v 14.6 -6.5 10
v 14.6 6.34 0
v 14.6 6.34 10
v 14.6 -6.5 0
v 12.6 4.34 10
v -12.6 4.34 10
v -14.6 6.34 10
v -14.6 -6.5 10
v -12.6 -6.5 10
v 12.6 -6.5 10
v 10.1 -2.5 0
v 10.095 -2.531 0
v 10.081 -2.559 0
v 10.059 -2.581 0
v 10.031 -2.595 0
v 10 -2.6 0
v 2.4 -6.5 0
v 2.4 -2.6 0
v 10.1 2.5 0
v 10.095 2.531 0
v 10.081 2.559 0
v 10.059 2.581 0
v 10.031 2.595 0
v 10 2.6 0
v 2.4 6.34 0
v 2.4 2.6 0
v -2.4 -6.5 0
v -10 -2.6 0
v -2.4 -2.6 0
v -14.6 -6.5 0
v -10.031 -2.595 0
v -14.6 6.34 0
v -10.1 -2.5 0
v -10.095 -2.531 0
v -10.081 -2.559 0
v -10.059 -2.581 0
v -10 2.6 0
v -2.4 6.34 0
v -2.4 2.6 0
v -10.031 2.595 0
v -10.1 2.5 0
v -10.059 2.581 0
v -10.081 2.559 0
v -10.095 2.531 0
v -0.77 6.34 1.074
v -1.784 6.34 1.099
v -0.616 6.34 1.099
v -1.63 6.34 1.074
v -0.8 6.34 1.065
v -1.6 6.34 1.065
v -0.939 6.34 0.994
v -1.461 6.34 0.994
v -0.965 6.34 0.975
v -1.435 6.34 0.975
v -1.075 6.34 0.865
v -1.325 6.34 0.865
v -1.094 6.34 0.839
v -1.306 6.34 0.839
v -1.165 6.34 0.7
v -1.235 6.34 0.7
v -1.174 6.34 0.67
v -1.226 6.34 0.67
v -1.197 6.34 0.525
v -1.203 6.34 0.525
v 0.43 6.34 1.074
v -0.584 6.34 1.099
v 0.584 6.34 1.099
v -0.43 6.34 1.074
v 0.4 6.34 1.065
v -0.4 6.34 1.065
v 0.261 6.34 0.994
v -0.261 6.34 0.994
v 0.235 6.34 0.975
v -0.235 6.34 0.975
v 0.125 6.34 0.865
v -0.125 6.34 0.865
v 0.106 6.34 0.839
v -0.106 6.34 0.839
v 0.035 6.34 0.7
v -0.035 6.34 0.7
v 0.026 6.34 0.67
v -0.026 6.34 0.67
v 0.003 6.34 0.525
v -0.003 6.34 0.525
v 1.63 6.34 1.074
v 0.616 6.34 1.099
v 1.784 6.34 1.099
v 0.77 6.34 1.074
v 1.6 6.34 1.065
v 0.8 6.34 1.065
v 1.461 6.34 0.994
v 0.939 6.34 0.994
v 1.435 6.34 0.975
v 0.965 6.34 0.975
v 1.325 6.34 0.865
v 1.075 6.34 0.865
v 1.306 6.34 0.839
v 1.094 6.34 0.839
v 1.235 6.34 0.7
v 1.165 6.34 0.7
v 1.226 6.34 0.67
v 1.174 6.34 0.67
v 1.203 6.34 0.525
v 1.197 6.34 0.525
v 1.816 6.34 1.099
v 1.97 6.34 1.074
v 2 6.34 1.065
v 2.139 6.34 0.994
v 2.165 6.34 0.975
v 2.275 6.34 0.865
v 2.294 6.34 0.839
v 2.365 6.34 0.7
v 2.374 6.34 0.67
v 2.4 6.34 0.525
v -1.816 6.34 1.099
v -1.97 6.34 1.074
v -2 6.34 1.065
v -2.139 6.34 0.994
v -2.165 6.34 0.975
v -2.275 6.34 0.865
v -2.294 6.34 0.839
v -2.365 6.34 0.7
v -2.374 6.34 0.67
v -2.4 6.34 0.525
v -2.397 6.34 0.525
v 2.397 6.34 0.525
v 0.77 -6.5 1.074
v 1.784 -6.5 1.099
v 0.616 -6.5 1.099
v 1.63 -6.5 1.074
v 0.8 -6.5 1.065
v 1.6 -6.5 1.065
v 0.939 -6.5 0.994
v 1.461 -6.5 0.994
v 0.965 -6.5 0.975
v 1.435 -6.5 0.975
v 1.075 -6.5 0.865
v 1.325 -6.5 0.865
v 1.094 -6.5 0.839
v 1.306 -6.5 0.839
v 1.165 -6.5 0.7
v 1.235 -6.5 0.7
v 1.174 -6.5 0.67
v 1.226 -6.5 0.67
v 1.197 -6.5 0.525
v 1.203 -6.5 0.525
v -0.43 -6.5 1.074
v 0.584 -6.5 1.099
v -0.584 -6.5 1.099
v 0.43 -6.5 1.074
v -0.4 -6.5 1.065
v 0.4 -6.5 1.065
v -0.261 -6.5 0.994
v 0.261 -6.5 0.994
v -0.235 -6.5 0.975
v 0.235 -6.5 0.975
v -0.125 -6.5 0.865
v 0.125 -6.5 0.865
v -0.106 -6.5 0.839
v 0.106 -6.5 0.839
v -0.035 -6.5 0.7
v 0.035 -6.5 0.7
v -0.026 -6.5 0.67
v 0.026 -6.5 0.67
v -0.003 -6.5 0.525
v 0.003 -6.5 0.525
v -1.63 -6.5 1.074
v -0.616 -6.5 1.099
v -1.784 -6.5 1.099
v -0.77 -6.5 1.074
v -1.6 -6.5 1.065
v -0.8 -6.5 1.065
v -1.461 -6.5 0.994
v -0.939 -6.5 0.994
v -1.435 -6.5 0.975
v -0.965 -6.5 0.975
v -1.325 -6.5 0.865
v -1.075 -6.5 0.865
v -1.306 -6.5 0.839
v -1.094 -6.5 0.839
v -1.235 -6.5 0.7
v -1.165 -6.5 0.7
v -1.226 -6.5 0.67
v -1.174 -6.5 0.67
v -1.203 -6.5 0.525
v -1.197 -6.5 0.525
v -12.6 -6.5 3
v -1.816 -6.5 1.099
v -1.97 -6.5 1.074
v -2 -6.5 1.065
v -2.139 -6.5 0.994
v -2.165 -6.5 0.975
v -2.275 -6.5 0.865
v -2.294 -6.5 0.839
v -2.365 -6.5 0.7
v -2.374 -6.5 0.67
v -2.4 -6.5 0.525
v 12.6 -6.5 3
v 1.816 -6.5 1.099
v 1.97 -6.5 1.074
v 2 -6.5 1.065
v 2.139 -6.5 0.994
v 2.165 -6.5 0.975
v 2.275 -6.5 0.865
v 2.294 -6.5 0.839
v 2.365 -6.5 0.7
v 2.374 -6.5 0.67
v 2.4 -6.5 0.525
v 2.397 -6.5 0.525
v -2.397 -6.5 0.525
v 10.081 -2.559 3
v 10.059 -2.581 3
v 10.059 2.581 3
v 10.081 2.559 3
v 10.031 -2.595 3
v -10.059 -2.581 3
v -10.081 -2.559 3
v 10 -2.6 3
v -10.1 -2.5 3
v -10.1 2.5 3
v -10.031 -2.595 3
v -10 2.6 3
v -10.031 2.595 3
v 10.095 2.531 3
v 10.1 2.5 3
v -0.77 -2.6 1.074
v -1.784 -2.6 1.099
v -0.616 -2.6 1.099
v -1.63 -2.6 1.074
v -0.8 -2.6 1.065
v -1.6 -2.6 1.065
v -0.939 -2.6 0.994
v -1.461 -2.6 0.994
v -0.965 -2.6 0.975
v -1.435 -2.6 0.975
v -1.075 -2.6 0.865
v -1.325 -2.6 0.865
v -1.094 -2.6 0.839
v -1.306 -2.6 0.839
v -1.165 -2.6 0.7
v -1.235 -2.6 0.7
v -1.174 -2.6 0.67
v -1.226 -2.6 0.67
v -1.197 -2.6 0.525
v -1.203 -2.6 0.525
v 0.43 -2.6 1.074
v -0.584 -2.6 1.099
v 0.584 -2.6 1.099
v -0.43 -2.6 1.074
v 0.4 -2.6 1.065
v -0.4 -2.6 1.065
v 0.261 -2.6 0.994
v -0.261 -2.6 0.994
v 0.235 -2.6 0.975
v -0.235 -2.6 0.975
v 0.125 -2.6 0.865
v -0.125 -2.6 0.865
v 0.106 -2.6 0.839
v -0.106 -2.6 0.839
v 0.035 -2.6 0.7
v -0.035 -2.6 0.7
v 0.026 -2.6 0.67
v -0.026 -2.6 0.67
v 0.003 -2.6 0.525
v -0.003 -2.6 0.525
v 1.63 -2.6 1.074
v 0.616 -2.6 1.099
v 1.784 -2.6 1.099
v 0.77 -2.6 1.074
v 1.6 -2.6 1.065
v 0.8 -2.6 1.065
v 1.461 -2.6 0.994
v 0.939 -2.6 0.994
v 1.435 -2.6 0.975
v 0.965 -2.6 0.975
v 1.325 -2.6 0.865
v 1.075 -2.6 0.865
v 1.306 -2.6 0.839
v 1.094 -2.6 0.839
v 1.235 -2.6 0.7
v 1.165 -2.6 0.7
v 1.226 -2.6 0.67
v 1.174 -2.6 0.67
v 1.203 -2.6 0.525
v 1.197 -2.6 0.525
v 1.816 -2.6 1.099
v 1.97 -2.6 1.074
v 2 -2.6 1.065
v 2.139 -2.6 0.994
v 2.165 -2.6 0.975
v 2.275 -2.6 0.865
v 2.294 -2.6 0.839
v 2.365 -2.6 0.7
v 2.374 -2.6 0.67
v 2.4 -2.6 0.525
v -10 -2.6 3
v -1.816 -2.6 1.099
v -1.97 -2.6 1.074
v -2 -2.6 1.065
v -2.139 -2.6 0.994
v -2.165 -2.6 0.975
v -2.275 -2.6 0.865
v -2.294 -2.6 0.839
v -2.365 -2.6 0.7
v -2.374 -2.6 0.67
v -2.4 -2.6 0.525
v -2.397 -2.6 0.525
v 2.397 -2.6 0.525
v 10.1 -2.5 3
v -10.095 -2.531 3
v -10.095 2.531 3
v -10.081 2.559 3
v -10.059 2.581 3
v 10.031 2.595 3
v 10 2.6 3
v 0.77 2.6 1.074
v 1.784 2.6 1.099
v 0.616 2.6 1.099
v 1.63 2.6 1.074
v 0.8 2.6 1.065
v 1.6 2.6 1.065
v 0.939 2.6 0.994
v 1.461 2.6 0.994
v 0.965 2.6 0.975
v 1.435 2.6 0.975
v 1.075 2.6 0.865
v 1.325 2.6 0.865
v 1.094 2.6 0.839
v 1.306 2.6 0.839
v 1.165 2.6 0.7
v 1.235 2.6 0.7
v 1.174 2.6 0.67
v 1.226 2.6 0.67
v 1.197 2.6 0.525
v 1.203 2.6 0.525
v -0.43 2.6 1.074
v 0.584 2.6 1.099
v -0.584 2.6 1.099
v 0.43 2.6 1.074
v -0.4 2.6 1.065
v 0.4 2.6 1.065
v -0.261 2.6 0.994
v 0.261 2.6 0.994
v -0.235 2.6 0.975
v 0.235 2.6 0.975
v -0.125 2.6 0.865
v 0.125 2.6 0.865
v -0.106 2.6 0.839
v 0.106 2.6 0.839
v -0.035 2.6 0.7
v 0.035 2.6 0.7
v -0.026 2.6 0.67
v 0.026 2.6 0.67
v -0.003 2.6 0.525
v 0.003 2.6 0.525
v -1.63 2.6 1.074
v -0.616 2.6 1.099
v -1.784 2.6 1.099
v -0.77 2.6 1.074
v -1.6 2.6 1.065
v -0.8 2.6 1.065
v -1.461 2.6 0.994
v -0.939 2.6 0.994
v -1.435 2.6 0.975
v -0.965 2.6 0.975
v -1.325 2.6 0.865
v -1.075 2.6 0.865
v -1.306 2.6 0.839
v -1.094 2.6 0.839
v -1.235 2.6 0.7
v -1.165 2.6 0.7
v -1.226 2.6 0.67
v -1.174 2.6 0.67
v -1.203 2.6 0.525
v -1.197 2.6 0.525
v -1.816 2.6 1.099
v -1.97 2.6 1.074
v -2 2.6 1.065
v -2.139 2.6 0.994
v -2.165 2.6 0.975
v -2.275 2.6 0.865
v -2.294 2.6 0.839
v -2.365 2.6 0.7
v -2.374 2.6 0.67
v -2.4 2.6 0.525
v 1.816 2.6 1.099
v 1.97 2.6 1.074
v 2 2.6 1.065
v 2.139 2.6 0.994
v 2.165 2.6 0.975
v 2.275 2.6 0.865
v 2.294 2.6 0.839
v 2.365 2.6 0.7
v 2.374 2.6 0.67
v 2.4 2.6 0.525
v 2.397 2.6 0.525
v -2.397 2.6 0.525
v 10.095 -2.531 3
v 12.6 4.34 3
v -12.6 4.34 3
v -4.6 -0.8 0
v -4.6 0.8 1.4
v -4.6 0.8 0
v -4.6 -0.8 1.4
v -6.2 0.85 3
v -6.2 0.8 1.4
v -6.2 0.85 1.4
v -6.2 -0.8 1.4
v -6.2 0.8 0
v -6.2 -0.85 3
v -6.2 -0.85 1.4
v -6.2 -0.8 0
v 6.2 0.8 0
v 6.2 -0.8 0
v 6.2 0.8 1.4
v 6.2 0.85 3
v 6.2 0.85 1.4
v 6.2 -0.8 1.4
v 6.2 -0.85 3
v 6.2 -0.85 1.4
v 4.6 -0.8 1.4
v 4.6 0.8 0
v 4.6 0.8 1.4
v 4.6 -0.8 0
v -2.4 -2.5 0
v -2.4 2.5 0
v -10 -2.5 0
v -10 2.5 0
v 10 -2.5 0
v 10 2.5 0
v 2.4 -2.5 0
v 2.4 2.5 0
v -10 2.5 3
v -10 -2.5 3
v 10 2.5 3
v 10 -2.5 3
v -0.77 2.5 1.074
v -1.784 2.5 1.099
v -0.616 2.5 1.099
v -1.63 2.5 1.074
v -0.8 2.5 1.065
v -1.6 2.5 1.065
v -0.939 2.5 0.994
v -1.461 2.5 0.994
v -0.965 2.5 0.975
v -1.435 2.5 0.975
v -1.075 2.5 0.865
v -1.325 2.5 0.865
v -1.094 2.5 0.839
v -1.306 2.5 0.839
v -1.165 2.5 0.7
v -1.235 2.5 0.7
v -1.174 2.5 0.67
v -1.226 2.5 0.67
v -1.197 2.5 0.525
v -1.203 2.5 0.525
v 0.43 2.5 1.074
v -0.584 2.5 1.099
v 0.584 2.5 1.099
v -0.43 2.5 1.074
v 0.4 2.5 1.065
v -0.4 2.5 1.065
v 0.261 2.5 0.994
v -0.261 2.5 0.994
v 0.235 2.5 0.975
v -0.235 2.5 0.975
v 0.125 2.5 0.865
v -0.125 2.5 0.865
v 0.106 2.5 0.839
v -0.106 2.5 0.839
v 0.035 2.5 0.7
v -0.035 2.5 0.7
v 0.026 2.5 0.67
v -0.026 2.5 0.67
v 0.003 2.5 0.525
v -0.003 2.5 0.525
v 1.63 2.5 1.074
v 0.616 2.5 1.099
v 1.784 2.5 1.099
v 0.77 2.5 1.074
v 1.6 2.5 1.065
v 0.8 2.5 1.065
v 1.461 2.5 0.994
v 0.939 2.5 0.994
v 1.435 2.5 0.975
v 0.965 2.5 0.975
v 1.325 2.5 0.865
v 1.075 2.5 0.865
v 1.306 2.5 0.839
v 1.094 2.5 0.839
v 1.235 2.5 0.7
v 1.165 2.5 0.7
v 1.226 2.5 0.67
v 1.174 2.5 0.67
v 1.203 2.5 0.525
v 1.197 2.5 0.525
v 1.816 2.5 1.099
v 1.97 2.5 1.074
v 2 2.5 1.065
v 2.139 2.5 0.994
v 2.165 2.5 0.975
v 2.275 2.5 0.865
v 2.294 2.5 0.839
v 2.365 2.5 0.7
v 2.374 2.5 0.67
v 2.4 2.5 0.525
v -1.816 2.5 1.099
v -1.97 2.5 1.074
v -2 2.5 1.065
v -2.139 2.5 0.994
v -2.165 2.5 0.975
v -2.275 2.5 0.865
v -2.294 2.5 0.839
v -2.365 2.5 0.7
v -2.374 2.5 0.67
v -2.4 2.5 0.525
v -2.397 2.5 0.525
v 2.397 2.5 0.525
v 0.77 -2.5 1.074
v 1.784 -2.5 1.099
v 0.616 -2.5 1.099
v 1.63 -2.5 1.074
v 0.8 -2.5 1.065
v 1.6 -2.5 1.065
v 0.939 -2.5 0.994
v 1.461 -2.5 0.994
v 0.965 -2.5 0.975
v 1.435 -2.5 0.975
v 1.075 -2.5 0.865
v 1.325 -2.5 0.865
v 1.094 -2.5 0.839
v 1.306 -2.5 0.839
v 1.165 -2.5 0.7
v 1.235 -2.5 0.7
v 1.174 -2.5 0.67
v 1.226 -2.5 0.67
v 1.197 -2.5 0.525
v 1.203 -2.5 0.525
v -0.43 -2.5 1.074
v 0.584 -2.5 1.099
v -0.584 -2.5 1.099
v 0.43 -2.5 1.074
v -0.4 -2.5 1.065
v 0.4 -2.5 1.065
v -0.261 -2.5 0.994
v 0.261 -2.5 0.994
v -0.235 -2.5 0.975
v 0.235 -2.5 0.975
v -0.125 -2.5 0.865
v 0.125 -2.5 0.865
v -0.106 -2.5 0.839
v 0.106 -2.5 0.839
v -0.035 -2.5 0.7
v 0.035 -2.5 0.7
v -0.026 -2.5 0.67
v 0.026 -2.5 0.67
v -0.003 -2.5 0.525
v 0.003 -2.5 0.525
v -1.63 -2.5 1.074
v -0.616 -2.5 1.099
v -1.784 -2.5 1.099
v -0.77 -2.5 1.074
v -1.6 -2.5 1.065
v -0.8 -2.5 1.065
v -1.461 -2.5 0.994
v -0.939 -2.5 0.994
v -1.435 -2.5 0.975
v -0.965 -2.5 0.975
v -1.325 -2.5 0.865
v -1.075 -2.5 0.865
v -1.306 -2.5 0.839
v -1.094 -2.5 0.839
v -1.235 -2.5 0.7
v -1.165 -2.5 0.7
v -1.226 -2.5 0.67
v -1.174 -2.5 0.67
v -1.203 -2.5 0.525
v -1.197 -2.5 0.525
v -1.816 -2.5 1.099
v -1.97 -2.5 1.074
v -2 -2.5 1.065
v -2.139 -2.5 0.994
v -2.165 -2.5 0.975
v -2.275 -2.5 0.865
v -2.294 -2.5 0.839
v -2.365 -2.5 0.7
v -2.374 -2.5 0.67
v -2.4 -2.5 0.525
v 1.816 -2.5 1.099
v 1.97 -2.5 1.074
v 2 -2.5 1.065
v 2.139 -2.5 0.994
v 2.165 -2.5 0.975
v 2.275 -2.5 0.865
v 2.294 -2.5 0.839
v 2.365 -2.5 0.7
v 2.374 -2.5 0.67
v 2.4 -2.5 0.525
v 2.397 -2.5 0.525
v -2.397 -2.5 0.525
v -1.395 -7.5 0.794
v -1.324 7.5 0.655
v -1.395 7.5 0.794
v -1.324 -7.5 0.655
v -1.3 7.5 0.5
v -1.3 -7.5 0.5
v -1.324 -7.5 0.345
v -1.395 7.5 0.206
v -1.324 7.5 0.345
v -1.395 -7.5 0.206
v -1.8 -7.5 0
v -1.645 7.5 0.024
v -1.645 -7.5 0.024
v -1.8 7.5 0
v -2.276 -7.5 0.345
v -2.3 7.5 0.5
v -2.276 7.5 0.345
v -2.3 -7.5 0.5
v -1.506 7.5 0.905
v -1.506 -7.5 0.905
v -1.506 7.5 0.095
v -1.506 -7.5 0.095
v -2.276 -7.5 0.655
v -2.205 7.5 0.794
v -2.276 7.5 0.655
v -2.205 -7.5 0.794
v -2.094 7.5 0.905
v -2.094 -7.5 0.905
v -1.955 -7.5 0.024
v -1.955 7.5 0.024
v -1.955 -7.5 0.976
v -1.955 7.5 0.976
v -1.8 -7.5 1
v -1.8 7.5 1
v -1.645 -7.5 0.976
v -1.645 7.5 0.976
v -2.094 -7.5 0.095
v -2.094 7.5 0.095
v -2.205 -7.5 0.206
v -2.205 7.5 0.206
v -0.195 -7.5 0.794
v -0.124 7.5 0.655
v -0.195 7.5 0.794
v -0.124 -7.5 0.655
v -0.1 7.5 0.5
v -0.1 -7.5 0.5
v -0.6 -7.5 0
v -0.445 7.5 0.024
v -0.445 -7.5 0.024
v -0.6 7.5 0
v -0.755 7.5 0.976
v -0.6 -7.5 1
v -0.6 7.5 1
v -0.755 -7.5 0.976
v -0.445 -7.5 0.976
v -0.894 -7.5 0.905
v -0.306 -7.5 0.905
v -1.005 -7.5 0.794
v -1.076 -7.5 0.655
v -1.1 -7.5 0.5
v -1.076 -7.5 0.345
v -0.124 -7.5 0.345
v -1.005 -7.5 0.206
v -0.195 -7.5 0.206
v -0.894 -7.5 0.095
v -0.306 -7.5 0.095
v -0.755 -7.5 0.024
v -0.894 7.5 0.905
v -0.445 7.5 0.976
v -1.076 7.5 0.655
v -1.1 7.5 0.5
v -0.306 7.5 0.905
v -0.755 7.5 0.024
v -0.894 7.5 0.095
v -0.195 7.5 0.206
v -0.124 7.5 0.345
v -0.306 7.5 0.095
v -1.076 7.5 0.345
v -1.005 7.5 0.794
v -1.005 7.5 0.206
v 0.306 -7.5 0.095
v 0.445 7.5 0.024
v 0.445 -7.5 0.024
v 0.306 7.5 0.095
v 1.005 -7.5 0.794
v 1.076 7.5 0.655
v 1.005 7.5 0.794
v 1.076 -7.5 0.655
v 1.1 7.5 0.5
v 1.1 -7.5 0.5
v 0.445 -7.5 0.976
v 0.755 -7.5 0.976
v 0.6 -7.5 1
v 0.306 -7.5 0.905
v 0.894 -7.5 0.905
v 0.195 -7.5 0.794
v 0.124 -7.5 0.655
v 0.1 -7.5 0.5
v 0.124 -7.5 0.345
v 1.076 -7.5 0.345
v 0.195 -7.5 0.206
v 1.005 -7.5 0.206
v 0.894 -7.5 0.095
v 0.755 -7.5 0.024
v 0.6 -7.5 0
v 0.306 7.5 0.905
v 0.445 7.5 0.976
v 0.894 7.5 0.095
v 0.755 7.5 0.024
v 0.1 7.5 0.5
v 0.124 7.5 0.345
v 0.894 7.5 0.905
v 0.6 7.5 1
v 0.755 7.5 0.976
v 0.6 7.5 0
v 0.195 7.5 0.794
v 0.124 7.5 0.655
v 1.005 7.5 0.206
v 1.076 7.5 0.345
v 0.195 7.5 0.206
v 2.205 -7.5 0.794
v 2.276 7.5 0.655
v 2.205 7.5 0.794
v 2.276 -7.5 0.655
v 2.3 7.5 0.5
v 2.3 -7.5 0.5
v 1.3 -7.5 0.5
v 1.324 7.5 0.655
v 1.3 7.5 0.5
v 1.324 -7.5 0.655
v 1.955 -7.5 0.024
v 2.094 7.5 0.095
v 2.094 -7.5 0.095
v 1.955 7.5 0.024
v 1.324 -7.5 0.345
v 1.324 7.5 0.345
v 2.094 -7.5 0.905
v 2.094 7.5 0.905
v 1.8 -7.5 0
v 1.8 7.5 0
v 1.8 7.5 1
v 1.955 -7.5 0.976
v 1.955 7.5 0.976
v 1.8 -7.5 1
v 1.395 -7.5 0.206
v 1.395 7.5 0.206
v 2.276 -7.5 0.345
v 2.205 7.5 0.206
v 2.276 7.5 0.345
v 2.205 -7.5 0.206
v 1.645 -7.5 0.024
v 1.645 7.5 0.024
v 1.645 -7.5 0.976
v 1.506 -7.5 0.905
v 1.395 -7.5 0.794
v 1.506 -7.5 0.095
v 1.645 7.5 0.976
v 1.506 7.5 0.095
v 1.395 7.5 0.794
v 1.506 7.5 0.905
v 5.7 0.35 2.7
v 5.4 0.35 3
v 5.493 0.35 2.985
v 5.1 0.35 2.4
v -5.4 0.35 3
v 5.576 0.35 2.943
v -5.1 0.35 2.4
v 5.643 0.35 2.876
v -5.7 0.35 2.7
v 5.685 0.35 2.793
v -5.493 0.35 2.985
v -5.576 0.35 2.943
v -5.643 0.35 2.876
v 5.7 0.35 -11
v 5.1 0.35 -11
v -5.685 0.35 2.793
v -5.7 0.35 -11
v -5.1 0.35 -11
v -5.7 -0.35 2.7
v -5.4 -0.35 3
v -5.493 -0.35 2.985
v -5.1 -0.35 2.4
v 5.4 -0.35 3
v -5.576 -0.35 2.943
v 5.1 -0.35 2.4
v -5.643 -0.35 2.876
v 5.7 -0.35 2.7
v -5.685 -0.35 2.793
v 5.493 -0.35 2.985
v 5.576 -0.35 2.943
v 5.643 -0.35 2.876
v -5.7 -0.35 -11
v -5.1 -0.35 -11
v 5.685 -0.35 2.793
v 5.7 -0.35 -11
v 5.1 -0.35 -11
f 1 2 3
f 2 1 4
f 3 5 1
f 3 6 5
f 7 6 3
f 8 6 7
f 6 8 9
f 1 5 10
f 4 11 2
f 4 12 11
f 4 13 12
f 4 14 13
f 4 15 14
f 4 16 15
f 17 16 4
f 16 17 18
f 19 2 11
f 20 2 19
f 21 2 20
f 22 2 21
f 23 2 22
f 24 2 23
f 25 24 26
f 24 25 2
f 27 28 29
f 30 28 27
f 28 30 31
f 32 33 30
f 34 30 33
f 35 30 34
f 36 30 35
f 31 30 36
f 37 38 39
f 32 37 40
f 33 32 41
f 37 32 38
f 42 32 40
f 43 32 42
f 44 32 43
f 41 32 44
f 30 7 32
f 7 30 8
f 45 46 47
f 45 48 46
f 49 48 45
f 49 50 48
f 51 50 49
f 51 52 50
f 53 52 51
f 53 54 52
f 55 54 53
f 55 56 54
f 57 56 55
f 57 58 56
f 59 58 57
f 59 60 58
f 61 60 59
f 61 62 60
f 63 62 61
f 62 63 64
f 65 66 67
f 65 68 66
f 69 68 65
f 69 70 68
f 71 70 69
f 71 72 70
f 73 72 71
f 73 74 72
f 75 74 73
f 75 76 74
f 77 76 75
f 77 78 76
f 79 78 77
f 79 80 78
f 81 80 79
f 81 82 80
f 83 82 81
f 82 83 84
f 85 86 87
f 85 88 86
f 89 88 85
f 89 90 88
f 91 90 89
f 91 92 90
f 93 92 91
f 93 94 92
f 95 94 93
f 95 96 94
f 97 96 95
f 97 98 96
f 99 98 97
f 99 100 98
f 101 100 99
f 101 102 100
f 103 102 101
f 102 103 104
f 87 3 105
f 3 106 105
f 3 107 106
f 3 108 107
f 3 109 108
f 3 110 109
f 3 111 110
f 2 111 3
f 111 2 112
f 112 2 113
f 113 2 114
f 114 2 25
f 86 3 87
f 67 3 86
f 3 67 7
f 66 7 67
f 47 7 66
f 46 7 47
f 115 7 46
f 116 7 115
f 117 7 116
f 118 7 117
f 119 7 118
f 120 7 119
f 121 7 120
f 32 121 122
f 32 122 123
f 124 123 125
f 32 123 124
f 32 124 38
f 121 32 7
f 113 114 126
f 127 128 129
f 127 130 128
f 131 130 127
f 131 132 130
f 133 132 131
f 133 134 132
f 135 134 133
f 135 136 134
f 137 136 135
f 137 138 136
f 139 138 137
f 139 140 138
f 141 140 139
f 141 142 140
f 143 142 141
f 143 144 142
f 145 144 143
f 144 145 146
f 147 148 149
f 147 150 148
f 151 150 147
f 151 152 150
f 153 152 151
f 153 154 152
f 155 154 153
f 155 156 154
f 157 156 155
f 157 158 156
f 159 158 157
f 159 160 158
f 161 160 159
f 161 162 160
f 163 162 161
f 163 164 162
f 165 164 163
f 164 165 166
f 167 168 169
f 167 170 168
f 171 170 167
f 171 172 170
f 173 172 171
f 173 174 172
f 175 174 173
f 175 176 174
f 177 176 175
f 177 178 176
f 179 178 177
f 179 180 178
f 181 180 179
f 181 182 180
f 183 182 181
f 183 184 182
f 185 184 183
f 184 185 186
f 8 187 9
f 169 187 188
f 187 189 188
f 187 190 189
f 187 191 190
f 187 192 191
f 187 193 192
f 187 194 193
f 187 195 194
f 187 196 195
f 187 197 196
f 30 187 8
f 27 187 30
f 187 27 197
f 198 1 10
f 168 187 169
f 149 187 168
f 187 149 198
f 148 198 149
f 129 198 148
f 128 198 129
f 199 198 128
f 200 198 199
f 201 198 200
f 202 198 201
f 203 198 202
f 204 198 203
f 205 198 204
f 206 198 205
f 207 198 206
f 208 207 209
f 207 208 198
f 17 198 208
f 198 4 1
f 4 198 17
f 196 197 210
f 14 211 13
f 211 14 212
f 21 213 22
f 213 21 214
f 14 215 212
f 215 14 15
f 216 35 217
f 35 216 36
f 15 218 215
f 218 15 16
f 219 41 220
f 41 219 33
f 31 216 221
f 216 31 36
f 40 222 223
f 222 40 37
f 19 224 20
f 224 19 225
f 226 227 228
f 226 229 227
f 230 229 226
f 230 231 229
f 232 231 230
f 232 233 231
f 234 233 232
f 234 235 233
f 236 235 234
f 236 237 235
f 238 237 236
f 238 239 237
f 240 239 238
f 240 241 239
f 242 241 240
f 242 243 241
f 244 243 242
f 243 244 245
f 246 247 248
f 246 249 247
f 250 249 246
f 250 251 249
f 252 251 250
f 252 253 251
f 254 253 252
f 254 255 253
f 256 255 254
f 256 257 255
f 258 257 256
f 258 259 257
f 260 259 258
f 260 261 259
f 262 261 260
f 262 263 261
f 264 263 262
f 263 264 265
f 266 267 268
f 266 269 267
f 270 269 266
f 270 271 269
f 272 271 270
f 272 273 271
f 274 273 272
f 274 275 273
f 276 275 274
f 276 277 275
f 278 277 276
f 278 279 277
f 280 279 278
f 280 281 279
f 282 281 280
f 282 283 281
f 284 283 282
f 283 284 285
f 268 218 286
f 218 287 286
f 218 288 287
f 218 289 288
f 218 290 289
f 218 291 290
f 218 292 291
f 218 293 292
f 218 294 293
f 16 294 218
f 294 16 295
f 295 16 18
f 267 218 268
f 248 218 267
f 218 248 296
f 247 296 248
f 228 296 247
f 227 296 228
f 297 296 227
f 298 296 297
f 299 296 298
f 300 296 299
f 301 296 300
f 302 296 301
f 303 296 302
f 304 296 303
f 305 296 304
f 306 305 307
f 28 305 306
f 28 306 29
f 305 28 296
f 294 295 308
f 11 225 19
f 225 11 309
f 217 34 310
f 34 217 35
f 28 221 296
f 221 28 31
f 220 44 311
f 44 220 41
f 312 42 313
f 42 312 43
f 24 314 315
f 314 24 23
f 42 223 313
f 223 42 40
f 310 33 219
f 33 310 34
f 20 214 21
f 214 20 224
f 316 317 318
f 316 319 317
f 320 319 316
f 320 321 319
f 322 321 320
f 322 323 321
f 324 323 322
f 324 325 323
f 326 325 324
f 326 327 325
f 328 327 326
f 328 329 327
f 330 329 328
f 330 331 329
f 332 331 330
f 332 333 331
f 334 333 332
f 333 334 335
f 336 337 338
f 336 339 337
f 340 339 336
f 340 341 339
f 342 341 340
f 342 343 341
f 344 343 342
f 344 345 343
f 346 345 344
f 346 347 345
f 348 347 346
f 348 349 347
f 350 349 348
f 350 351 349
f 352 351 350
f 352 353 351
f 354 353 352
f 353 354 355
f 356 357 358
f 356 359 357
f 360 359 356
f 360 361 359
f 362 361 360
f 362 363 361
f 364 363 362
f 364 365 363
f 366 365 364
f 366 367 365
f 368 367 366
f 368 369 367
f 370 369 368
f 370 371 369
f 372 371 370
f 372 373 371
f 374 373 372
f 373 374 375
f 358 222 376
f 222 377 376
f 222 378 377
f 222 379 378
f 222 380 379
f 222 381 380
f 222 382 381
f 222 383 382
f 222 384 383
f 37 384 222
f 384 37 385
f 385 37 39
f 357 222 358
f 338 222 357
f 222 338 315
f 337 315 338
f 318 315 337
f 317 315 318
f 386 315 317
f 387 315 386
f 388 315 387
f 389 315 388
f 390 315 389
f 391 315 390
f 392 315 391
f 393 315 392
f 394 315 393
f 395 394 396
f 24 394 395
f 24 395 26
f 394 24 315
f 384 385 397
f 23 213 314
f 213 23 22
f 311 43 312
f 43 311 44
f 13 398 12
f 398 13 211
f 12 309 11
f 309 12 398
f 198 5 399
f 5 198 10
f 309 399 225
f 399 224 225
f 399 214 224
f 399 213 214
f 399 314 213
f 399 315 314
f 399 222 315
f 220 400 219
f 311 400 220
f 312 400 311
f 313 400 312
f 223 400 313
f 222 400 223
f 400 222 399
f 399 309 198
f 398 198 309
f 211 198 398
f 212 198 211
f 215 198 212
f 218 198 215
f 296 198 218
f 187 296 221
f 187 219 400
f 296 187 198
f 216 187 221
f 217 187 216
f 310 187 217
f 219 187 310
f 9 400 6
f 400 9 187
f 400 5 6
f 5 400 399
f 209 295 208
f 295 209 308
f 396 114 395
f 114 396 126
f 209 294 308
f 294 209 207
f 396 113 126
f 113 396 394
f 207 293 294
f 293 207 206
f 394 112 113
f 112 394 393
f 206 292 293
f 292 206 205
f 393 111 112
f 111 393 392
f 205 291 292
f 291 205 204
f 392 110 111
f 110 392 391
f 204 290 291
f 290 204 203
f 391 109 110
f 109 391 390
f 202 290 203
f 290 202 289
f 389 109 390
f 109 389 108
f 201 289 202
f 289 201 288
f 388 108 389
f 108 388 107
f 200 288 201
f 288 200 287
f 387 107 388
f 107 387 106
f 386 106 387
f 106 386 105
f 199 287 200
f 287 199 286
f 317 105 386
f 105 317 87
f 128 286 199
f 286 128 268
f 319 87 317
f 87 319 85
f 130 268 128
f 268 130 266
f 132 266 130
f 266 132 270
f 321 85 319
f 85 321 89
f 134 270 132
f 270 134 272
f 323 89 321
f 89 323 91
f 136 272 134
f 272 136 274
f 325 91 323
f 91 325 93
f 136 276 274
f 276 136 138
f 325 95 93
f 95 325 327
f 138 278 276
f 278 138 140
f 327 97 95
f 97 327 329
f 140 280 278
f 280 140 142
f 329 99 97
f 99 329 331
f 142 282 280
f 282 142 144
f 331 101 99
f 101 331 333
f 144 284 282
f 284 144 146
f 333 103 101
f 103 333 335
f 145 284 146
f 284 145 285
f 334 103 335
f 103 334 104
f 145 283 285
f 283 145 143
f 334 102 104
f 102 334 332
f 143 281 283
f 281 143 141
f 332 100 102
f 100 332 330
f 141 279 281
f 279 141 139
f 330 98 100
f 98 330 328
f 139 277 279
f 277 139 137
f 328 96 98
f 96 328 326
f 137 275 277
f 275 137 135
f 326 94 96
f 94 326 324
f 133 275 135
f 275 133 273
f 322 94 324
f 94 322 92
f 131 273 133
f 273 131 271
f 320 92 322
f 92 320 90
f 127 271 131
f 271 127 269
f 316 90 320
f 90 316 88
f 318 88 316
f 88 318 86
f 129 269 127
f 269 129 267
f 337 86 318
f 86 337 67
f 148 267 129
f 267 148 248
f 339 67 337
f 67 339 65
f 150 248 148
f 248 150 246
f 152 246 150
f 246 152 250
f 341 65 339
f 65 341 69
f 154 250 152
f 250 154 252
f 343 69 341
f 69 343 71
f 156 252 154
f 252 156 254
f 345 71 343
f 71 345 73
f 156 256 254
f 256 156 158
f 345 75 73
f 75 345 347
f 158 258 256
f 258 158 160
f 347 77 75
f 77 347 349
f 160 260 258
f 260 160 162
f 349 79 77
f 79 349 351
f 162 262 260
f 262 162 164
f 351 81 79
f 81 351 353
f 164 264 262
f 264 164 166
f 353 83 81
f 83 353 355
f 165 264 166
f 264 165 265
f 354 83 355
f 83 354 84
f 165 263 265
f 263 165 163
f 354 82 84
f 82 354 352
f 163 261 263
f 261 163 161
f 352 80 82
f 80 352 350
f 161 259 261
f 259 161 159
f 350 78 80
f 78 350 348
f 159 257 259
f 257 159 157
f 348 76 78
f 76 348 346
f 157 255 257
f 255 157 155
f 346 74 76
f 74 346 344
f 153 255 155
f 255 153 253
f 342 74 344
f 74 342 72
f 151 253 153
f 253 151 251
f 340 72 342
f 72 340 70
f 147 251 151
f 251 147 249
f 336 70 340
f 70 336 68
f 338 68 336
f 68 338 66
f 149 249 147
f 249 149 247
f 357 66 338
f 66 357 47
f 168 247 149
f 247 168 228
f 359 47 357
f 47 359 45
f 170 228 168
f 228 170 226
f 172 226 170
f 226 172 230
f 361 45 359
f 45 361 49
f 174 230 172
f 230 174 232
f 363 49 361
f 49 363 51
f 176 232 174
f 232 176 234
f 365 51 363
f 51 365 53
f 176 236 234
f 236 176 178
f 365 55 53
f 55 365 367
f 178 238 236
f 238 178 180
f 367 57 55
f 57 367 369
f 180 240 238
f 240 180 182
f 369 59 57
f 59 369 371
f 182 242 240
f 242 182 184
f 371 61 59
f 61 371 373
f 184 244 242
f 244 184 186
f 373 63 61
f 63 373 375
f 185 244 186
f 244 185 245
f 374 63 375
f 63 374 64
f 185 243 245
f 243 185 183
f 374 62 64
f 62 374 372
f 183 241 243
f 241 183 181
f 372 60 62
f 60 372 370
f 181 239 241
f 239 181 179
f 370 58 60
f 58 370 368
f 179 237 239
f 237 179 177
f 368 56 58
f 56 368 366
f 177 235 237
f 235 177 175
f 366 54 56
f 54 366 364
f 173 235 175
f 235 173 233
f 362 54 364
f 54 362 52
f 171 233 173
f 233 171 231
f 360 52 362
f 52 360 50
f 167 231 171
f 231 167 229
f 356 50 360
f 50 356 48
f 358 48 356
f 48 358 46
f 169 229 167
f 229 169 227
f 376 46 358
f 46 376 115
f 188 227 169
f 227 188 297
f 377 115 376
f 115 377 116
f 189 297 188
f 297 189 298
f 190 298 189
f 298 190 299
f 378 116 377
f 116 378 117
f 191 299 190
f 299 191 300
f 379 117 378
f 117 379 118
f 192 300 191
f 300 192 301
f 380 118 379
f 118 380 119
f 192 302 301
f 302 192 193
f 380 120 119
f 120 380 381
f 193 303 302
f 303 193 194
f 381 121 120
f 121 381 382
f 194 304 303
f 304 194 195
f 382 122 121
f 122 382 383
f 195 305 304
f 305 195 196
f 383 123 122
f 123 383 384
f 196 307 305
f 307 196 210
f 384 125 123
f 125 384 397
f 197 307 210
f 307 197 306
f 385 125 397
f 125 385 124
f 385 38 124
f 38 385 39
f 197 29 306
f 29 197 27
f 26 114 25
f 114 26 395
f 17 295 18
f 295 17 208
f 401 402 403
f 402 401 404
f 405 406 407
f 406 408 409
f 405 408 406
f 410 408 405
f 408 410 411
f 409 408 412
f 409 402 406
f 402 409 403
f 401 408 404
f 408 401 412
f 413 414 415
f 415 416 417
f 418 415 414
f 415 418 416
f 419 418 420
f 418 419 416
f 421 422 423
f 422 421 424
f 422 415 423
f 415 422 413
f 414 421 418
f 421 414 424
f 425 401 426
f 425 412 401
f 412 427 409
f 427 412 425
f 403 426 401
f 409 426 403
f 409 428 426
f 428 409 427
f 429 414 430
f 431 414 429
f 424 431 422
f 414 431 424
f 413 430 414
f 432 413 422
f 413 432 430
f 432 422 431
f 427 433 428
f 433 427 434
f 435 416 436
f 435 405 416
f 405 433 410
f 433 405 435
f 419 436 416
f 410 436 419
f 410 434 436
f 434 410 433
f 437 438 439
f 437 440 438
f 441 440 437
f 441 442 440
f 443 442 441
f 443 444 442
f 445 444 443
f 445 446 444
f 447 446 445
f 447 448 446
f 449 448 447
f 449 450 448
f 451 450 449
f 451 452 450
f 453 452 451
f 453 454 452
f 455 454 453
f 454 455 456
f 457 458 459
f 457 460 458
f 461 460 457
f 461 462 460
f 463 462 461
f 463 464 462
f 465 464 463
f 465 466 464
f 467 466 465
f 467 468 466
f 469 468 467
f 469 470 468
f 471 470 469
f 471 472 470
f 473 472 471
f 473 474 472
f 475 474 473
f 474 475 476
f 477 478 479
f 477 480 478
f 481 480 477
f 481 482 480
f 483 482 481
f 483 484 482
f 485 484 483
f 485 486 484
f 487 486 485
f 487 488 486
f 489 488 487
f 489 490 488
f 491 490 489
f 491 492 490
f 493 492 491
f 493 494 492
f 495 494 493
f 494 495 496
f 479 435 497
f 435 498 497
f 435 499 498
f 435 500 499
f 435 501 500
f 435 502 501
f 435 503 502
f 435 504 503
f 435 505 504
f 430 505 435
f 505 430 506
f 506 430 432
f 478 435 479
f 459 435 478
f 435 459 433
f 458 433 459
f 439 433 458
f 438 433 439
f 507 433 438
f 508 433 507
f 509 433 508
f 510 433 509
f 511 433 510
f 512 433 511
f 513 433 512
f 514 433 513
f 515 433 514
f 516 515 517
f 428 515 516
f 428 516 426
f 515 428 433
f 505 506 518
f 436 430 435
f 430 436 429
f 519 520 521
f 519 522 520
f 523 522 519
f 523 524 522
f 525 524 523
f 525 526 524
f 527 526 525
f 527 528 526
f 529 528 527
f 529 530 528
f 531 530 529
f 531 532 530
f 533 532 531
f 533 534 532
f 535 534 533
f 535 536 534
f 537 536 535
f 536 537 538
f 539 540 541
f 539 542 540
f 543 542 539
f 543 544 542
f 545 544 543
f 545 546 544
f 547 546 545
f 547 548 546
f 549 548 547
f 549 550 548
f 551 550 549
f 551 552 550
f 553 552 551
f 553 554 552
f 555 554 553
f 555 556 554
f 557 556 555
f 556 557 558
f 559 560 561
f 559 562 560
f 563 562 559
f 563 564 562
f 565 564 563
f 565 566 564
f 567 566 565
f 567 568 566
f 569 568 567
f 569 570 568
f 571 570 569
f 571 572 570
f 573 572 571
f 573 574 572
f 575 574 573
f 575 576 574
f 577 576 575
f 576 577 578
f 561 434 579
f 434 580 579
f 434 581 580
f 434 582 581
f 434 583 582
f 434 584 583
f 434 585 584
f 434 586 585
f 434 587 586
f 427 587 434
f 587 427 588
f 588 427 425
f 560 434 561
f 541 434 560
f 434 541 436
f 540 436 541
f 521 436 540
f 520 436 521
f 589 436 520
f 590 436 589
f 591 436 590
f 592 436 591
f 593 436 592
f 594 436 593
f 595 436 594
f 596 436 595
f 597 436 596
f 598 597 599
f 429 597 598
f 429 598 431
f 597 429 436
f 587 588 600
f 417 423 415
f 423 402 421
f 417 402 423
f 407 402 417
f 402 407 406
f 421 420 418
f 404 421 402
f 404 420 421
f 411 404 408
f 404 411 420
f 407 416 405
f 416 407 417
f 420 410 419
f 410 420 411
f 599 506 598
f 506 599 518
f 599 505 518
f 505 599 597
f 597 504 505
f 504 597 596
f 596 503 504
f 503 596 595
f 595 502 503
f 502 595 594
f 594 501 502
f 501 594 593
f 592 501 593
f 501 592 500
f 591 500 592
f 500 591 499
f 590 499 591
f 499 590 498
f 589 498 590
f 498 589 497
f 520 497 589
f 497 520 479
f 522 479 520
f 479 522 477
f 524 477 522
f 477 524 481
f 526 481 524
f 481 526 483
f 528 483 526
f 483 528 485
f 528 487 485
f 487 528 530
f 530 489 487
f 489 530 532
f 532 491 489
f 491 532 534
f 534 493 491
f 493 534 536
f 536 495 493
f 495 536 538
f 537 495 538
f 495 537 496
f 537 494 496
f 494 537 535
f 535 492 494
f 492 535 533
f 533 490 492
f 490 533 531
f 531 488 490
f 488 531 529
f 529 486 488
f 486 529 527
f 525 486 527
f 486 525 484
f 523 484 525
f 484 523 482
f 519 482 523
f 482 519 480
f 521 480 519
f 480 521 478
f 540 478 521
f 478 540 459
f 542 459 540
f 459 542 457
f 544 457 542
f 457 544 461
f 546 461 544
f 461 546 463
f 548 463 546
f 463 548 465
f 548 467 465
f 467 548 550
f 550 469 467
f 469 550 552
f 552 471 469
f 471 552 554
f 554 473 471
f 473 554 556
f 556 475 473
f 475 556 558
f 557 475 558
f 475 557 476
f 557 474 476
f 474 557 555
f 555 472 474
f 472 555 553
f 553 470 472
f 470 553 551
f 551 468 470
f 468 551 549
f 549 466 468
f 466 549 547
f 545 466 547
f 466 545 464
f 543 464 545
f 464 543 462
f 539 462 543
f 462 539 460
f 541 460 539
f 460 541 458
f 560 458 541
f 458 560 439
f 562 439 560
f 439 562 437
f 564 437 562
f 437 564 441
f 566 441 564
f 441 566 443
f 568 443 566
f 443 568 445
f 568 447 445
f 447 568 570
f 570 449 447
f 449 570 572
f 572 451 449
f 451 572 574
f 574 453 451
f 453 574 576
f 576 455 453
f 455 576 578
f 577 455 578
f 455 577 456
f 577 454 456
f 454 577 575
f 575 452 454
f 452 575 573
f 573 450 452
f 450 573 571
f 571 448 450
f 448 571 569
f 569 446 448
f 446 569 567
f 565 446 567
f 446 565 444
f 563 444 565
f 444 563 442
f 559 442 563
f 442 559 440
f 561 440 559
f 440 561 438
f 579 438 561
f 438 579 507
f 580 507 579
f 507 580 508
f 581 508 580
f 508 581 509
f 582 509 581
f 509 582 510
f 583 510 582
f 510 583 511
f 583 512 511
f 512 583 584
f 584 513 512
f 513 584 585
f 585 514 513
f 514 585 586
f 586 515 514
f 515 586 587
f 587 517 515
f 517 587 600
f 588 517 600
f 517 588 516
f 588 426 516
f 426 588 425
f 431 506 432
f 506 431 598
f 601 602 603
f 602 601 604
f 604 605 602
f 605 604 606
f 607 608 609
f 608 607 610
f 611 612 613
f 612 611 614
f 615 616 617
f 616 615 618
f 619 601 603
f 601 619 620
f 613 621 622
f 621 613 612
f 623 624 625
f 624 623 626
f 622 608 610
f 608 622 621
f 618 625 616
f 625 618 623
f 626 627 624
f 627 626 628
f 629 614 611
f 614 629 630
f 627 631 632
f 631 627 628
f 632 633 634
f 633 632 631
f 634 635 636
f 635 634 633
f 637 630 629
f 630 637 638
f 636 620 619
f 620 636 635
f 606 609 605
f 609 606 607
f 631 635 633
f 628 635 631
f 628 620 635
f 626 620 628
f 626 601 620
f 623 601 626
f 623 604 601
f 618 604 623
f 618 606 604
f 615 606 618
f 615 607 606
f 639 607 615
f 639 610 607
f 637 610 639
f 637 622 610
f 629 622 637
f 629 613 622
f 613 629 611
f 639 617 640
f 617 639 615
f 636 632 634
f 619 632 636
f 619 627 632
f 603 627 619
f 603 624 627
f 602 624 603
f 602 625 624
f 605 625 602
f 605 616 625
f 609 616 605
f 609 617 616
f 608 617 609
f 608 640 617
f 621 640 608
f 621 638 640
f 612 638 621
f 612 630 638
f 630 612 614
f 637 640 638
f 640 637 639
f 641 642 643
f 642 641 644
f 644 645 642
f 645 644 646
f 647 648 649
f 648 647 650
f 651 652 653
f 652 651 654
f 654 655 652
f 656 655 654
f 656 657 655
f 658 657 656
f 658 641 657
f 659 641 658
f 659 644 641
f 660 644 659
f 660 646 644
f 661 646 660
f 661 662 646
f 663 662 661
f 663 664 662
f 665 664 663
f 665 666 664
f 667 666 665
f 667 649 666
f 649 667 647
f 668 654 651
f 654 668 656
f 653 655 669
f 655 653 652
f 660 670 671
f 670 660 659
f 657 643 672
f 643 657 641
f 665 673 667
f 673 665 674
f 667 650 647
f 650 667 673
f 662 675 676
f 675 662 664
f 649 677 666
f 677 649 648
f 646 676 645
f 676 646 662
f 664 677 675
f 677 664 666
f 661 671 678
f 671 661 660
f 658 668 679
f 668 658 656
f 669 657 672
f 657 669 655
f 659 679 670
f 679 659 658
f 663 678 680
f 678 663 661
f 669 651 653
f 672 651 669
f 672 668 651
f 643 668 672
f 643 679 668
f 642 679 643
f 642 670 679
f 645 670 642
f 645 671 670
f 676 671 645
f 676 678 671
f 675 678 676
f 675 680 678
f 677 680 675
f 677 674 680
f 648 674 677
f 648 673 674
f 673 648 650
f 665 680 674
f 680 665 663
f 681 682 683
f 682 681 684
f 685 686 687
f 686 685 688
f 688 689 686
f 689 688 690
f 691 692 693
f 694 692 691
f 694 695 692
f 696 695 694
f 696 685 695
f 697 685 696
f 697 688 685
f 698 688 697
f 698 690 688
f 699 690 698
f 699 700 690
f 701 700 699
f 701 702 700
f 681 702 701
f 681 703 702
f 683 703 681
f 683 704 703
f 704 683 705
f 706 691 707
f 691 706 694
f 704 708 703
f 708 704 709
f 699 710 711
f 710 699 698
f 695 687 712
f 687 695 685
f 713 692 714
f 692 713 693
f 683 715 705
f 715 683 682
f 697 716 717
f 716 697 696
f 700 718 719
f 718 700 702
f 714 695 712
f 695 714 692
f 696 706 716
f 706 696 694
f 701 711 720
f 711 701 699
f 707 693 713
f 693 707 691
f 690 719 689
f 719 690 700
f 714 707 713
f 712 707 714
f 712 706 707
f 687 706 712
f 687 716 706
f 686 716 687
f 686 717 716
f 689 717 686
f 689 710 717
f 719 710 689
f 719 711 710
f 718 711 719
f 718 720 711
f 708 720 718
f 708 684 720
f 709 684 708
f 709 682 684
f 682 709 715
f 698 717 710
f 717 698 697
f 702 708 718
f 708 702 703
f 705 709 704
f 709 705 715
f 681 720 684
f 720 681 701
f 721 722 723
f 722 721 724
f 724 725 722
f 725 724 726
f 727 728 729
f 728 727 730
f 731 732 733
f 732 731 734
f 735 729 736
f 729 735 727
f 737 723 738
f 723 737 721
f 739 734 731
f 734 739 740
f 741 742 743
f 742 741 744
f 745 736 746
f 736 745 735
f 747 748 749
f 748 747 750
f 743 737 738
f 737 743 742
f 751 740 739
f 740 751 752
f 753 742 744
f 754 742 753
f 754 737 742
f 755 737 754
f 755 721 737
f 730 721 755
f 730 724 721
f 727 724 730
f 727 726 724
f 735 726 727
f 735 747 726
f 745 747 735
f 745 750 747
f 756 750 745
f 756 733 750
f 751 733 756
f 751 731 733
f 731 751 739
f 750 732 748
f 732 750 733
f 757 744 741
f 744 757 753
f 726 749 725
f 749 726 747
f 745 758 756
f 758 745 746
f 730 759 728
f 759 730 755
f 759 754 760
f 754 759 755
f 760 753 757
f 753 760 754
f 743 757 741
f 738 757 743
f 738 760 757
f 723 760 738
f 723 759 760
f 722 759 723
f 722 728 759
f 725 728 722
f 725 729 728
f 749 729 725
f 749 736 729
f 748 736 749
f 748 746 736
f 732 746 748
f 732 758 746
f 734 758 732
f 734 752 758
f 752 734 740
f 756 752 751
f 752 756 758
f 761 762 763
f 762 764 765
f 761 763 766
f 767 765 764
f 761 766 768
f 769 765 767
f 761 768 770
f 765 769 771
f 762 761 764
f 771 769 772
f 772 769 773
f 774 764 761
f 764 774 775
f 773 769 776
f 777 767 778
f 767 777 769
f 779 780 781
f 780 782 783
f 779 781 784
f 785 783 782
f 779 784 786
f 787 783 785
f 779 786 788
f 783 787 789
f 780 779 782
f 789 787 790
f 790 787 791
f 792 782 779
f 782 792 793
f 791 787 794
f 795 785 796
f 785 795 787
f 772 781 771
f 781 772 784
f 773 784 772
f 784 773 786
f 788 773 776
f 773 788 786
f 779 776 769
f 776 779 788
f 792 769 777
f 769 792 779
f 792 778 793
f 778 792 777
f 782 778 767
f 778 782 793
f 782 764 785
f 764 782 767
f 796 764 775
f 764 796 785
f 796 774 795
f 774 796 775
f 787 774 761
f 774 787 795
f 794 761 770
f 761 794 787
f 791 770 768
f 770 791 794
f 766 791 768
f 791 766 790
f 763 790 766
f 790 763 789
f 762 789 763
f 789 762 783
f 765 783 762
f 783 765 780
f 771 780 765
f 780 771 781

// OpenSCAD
// cable clamp for stabler

/* [show] */
$fn=20;
showStaple=true;
showCable=true;
showClamp=true;
showClampHolder=true;
showStaplerDummy=false;

/* [Cable] */
wireDia=1;
wireCount=4;
wireSpcng=0.2;

/* [Staples] */
stplType="53"; //["53","custom"]
stplCstmShldrWdth=11.4;
stplCstmWrWdth=0.7;
stplCstmWrThck=0.6;
stplLngth=14;

/* [Clamp Holder] */
//max. width of the stapler at the front
stplrWdth=25;
//offset from front to center of staple
stplrFrntOffset=4.24;
//wall thickness
minWallThck=2;
//spacing between holder and clamp
hldrSpcng=0.1;
//spacing between holder and stapler
stplrSpcng=0.1;
//height of the holder
hldrHght=10;

/* [Clamp] */
clmpStyle="block"; //["block","rndBlck"]
//overall Clamp Dimensions
clampDims=[20,5,3];
//spacing for the staple
stplSpcng=0.5;
cblSpcng=0.1;


/* [Hidden] */
fudge=0.1;
// -- staples --
//https://en.wikipedia.org/wiki/Staple_(fastener)
//https://de.wikipedia.org/wiki/Heftklammer

//[shoulder width , wire width , length/height, wire thick
stplDims= (stplType=="53") ? [11.4,0.7,stplLngth,0.6] : [stplCstmShldrWdth,stplCstmThck,stplLngth,cstmWrThck];

cblColors=["brown","red","orange","yellow","green","blue","purple","grey","white","black"];

//assembly
if (showClampHolder)
 color("grey") clampHolder();

if (showClamp)
  color("darkRed") clamp();
if (showStaple) 
  translate([0,0,clampDims.z-stplDims[3]]) staple();
if (showCable)
  cable();

module staple(){
  color("silver") rotate([90,0,0])  linear_extrude(stplDims.y,center=true){
    translate([0,stplDims[3]/2]) square([stplDims.x-stplDims[3],stplDims[3]],true);
    for (ix=[-1,1]){
      translate([ix*(stplDims.x-stplDims[3])/2,-stplDims.z/2+stplDims[3]*0.75]) 
        square([stplDims[3],stplDims.z-stplDims[3]/2],true);
      translate([ix*(stplDims.x-stplDims[3])/2,+stplDims[3]/2]) circle(d=stplDims[3],$fn=20);
    }
  }
}

module clamp(cut=false){
  
  if (cut)
    bodyShp();
  else
    difference(){
      linear_extrude(clampDims.z) bodyShp();
      translate([0,0,clampDims.z-stplDims[3]/2-stplSpcng+fudge/2]) 
        cube([stplDims.x+stplSpcng*2,stplDims.y+stplSpcng*2,stplDims[3]+stplSpcng*2+fudge],true);
      for (ix=[-1,1])
        translate([ix*(stplDims.x-stplDims[3])/2,0,(clampDims.z-fudge)/2]) 
          cube([stplDims[3]+stplSpcng*2,stplDims[3]+stplSpcng*2,clampDims.z+fudge],true);
      rotate([90,0,0]) linear_extrude(clampDims.y+fudge,center=true,convexity=3)
        cable(true);
    }
  
  module bodyShp(){
    if (clmpStyle=="block")
      square([clampDims.x,clampDims.y],true);
    else
      hull() for (ix=[-1,1])
        translate([ix*(clampDims.x-clampDims.y)/2,0]) circle(d=clampDims.y);
  }
}

module cable(cut=false){
  if (cut){
    for(ix=[-(wireCount-1)/2:(wireCount-1)/2])
      translate([ix*(wireDia+wireSpcng),wireDia/2]) offset(cblSpcng) circle(d=wireDia,$fn=20);
    translate([0,(wireDia-cblSpcng)/4-fudge/2]) 
      square([wireDia*(wireCount+wireSpcng)+cblSpcng*2+wireSpcng*2,wireDia/2+cblSpcng+fudge],true);
  }
  else
    for(ix=[-(wireCount-1)/2:(wireCount-1)/2]){
      col=cblColors[ix+(wireCount-1)/2];
      color(col) translate([ix*(wireDia+wireSpcng),0,wireDia/2]) 
        rotate([90,0,0]) cylinder(d=wireDia,h=clampDims.y*3,$fn=20,center=true);
    }
}

if (showStaplerDummy) staplerDummy();
  
module staplerDummy(){
  //cheap NOVUS J-01A hand stapler (discontinued)
  %translate([0,-stplDims.y/2,clampDims.z]){
    translate([0,4.6/2,5]) cube([24.9,4.6,10],true);
    translate([0,-(12-4.6)/2,4.5/2]) cube([23.3,12-4.6,4.5],true);
    translate([0,-(12-4.6)/2,4.5+ 5.5/2]) cube([23.3-0.4,12-4.6,5.5],true);
  }
}

module clampHolder(){
  //a holder to attach to the stapler
  
  //staplerside
  hldrDpth= (stplrFrntOffset>clampDims.y/2) ? stplrFrntOffset+minWallThck*3+clampDims.y/2+stplrSpcng : 0;
  ovDims=[stplrWdth+(minWallThck+stplrSpcng)*2,hldrDpth,max(hldrHght,clampDims.z*2)];
  cntrYOffset=-ovDims.y/2+stplrFrntOffset+stplrSpcng+minWallThck;
  
  difference(){
    //body
    translate([0,cntrYOffset,ovDims.z/2]) cube(ovDims,true);
    //clamp
    translate([0,0,-fudge/2]) linear_extrude(clampDims.z+fudge) offset(hldrSpcng) clamp(true);
    //Stapler
    translate([0,-ovDims.y/2+stplrFrntOffset+stplrSpcng,clampDims.z+ovDims.z/2])
      cube([stplrWdth+stplrSpcng*2,ovDims.y,ovDims.z],true);
    //cable
    translate([0,cntrYOffset,0]) rotate([90,0,0]) linear_extrude(ovDims.y+fudge,center=true,convexity=3) cable(true);
  }
}
